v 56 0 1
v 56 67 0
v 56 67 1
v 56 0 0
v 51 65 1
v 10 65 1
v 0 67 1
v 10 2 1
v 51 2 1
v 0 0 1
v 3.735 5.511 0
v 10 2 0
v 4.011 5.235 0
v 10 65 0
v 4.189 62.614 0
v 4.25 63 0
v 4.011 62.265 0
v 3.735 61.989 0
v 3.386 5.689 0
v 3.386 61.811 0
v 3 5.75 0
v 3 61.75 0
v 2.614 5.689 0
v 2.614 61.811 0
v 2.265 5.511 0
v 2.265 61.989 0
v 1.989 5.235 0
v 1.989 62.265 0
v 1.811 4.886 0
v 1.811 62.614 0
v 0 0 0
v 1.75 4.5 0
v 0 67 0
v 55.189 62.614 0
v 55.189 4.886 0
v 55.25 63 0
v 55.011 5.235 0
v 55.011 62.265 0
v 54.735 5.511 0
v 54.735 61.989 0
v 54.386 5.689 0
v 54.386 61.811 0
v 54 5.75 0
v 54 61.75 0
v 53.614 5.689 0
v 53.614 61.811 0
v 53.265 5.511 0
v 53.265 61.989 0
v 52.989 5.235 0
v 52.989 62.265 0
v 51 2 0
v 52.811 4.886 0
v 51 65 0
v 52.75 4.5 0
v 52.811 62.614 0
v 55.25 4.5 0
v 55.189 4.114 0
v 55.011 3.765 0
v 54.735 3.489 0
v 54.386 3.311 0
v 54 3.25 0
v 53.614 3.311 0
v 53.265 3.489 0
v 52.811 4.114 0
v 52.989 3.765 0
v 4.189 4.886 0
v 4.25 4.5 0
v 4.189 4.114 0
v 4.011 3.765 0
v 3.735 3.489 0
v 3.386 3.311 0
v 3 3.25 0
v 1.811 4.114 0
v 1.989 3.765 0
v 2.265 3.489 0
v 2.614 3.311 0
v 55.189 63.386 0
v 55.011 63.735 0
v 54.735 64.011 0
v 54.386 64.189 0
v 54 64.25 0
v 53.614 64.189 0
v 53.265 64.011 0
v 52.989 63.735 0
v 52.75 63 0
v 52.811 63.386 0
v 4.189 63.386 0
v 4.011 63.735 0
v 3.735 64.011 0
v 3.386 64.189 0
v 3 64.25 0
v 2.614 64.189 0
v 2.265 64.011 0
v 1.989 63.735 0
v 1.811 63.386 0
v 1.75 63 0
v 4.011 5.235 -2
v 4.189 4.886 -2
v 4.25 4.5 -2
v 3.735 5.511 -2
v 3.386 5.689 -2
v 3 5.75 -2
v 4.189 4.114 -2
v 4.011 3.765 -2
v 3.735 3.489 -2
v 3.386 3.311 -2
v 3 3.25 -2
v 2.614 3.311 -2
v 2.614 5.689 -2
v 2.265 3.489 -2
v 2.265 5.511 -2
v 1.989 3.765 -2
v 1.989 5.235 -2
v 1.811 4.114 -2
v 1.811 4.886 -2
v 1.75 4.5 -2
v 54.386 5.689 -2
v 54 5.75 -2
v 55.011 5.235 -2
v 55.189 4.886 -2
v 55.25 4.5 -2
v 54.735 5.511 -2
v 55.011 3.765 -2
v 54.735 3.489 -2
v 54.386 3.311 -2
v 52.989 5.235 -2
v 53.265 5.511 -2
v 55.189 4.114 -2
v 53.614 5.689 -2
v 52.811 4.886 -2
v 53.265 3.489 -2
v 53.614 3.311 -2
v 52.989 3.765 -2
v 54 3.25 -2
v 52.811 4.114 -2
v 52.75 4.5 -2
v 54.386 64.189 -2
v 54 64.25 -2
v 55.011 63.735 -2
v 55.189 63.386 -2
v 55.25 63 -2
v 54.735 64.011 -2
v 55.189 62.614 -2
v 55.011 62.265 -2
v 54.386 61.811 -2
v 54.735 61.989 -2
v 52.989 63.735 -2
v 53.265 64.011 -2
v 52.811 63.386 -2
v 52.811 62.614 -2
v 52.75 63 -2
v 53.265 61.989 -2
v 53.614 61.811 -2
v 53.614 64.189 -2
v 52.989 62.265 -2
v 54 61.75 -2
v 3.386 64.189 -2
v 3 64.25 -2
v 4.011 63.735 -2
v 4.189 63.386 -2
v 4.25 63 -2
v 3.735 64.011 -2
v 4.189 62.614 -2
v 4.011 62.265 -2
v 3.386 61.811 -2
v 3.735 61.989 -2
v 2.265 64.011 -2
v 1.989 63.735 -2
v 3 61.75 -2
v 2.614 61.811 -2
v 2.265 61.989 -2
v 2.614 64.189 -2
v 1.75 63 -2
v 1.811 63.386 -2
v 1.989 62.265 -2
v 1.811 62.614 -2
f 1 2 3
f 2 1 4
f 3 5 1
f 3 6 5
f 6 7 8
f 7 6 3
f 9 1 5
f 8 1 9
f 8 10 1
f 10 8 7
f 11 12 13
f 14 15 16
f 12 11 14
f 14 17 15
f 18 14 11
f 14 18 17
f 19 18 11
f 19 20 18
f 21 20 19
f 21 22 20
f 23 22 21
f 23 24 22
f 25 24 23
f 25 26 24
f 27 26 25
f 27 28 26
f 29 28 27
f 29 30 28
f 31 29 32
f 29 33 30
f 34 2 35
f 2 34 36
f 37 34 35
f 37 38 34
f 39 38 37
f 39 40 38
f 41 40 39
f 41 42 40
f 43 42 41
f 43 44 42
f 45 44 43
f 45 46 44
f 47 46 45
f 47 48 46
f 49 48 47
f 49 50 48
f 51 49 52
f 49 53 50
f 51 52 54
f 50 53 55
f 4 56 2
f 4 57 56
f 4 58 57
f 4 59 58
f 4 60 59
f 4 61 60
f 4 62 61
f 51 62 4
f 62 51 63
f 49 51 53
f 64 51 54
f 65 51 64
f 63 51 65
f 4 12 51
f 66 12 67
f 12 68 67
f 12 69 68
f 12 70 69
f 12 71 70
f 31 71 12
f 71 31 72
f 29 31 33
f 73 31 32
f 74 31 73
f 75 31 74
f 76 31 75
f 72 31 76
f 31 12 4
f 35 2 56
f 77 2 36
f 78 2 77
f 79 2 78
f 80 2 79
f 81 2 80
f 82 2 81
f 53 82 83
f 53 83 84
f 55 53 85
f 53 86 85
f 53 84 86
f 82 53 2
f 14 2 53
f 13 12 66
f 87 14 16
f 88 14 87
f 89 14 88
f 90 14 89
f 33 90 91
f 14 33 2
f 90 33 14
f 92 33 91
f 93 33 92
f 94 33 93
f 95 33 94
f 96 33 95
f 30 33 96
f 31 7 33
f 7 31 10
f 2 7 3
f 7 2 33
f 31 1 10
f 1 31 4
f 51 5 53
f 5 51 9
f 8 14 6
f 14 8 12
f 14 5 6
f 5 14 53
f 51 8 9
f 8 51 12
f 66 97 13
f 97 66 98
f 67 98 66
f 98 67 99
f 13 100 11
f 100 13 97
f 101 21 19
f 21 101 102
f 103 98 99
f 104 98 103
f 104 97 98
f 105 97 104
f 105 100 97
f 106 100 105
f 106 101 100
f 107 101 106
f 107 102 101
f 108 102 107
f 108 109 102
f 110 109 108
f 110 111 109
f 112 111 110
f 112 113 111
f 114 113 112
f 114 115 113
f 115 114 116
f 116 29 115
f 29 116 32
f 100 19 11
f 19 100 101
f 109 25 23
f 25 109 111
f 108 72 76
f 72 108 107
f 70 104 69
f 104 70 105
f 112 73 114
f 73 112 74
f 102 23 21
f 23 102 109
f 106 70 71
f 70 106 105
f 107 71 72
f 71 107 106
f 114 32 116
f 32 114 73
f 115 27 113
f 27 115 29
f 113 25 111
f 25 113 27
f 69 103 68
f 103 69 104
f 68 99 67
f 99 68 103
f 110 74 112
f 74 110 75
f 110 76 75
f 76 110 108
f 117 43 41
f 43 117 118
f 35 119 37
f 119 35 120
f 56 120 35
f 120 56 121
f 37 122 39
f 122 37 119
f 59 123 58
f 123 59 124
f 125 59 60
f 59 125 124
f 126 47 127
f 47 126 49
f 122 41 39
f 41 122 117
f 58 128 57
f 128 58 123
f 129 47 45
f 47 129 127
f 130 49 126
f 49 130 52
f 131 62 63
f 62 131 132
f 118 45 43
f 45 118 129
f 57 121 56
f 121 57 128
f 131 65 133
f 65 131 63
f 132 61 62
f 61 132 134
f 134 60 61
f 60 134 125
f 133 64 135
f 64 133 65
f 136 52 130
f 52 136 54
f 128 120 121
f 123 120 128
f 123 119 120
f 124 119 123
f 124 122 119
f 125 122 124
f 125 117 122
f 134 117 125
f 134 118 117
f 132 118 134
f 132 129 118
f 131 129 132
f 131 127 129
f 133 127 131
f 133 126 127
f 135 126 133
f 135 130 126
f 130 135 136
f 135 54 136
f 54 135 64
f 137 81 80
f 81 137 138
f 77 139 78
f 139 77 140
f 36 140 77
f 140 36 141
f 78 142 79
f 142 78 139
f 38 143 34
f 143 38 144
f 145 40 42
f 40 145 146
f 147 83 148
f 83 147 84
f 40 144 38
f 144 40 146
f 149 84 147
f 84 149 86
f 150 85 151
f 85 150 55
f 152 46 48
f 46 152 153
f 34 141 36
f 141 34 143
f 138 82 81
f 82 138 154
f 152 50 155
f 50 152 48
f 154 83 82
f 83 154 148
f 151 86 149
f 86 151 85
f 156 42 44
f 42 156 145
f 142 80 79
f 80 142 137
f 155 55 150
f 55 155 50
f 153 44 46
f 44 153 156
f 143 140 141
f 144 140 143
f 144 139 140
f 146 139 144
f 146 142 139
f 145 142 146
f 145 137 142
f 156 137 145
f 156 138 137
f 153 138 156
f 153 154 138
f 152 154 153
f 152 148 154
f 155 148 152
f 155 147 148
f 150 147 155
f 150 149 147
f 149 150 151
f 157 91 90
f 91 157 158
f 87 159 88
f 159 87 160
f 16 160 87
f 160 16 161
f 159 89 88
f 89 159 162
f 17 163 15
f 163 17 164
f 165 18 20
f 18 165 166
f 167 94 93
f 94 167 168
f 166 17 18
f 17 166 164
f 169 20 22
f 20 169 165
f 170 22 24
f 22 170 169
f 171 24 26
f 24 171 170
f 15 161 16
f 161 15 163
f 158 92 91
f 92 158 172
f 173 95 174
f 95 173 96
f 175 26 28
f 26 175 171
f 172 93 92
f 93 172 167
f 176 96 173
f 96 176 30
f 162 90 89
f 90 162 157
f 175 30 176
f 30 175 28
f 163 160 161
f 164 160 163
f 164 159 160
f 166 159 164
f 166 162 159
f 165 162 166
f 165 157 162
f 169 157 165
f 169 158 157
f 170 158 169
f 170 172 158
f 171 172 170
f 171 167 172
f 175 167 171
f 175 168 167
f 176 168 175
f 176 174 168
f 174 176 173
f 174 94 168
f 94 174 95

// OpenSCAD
use <MCAD/boxes.scad>
$fa=1;
$fs=0.4;

lcd_L = 41;
lcd_l = 63;
board_L = 56;
board_l = 63;

plot_lcd_r=2.5/2;
plot_L=51;
plot_l=58.5;
board_thickness=2;
 

module plots_lcd () {
//plots
translate([0,0,0])
#cylinder(h=board_thickness, r=plot_lcd_r);
translate([plot_L,0,0])
#cylinder(h=board_thickness, r=plot_lcd_r);
translate([plot_L,plot_l,0])
#cylinder(h=board_thickness, r=plot_lcd_r);
translate([0,plot_l,0])
#cylinder(h=board_thickness, r=plot_lcd_r);
}

module support_lcd(  box_thickness=1, tower_thickness = 2) {

// boarder:
difference(){
    cube(size=[board_L,
               board_l+tower_thickness*2,
               box_thickness]);
    // remove LCD:
    translate([10,board_thickness,0])
        #cube(size=[lcd_L,lcd_l,box_thickness]);
}

translate([3,2.5+tower_thickness,-board_thickness])
    plots_lcd();
}

support_lcd();
